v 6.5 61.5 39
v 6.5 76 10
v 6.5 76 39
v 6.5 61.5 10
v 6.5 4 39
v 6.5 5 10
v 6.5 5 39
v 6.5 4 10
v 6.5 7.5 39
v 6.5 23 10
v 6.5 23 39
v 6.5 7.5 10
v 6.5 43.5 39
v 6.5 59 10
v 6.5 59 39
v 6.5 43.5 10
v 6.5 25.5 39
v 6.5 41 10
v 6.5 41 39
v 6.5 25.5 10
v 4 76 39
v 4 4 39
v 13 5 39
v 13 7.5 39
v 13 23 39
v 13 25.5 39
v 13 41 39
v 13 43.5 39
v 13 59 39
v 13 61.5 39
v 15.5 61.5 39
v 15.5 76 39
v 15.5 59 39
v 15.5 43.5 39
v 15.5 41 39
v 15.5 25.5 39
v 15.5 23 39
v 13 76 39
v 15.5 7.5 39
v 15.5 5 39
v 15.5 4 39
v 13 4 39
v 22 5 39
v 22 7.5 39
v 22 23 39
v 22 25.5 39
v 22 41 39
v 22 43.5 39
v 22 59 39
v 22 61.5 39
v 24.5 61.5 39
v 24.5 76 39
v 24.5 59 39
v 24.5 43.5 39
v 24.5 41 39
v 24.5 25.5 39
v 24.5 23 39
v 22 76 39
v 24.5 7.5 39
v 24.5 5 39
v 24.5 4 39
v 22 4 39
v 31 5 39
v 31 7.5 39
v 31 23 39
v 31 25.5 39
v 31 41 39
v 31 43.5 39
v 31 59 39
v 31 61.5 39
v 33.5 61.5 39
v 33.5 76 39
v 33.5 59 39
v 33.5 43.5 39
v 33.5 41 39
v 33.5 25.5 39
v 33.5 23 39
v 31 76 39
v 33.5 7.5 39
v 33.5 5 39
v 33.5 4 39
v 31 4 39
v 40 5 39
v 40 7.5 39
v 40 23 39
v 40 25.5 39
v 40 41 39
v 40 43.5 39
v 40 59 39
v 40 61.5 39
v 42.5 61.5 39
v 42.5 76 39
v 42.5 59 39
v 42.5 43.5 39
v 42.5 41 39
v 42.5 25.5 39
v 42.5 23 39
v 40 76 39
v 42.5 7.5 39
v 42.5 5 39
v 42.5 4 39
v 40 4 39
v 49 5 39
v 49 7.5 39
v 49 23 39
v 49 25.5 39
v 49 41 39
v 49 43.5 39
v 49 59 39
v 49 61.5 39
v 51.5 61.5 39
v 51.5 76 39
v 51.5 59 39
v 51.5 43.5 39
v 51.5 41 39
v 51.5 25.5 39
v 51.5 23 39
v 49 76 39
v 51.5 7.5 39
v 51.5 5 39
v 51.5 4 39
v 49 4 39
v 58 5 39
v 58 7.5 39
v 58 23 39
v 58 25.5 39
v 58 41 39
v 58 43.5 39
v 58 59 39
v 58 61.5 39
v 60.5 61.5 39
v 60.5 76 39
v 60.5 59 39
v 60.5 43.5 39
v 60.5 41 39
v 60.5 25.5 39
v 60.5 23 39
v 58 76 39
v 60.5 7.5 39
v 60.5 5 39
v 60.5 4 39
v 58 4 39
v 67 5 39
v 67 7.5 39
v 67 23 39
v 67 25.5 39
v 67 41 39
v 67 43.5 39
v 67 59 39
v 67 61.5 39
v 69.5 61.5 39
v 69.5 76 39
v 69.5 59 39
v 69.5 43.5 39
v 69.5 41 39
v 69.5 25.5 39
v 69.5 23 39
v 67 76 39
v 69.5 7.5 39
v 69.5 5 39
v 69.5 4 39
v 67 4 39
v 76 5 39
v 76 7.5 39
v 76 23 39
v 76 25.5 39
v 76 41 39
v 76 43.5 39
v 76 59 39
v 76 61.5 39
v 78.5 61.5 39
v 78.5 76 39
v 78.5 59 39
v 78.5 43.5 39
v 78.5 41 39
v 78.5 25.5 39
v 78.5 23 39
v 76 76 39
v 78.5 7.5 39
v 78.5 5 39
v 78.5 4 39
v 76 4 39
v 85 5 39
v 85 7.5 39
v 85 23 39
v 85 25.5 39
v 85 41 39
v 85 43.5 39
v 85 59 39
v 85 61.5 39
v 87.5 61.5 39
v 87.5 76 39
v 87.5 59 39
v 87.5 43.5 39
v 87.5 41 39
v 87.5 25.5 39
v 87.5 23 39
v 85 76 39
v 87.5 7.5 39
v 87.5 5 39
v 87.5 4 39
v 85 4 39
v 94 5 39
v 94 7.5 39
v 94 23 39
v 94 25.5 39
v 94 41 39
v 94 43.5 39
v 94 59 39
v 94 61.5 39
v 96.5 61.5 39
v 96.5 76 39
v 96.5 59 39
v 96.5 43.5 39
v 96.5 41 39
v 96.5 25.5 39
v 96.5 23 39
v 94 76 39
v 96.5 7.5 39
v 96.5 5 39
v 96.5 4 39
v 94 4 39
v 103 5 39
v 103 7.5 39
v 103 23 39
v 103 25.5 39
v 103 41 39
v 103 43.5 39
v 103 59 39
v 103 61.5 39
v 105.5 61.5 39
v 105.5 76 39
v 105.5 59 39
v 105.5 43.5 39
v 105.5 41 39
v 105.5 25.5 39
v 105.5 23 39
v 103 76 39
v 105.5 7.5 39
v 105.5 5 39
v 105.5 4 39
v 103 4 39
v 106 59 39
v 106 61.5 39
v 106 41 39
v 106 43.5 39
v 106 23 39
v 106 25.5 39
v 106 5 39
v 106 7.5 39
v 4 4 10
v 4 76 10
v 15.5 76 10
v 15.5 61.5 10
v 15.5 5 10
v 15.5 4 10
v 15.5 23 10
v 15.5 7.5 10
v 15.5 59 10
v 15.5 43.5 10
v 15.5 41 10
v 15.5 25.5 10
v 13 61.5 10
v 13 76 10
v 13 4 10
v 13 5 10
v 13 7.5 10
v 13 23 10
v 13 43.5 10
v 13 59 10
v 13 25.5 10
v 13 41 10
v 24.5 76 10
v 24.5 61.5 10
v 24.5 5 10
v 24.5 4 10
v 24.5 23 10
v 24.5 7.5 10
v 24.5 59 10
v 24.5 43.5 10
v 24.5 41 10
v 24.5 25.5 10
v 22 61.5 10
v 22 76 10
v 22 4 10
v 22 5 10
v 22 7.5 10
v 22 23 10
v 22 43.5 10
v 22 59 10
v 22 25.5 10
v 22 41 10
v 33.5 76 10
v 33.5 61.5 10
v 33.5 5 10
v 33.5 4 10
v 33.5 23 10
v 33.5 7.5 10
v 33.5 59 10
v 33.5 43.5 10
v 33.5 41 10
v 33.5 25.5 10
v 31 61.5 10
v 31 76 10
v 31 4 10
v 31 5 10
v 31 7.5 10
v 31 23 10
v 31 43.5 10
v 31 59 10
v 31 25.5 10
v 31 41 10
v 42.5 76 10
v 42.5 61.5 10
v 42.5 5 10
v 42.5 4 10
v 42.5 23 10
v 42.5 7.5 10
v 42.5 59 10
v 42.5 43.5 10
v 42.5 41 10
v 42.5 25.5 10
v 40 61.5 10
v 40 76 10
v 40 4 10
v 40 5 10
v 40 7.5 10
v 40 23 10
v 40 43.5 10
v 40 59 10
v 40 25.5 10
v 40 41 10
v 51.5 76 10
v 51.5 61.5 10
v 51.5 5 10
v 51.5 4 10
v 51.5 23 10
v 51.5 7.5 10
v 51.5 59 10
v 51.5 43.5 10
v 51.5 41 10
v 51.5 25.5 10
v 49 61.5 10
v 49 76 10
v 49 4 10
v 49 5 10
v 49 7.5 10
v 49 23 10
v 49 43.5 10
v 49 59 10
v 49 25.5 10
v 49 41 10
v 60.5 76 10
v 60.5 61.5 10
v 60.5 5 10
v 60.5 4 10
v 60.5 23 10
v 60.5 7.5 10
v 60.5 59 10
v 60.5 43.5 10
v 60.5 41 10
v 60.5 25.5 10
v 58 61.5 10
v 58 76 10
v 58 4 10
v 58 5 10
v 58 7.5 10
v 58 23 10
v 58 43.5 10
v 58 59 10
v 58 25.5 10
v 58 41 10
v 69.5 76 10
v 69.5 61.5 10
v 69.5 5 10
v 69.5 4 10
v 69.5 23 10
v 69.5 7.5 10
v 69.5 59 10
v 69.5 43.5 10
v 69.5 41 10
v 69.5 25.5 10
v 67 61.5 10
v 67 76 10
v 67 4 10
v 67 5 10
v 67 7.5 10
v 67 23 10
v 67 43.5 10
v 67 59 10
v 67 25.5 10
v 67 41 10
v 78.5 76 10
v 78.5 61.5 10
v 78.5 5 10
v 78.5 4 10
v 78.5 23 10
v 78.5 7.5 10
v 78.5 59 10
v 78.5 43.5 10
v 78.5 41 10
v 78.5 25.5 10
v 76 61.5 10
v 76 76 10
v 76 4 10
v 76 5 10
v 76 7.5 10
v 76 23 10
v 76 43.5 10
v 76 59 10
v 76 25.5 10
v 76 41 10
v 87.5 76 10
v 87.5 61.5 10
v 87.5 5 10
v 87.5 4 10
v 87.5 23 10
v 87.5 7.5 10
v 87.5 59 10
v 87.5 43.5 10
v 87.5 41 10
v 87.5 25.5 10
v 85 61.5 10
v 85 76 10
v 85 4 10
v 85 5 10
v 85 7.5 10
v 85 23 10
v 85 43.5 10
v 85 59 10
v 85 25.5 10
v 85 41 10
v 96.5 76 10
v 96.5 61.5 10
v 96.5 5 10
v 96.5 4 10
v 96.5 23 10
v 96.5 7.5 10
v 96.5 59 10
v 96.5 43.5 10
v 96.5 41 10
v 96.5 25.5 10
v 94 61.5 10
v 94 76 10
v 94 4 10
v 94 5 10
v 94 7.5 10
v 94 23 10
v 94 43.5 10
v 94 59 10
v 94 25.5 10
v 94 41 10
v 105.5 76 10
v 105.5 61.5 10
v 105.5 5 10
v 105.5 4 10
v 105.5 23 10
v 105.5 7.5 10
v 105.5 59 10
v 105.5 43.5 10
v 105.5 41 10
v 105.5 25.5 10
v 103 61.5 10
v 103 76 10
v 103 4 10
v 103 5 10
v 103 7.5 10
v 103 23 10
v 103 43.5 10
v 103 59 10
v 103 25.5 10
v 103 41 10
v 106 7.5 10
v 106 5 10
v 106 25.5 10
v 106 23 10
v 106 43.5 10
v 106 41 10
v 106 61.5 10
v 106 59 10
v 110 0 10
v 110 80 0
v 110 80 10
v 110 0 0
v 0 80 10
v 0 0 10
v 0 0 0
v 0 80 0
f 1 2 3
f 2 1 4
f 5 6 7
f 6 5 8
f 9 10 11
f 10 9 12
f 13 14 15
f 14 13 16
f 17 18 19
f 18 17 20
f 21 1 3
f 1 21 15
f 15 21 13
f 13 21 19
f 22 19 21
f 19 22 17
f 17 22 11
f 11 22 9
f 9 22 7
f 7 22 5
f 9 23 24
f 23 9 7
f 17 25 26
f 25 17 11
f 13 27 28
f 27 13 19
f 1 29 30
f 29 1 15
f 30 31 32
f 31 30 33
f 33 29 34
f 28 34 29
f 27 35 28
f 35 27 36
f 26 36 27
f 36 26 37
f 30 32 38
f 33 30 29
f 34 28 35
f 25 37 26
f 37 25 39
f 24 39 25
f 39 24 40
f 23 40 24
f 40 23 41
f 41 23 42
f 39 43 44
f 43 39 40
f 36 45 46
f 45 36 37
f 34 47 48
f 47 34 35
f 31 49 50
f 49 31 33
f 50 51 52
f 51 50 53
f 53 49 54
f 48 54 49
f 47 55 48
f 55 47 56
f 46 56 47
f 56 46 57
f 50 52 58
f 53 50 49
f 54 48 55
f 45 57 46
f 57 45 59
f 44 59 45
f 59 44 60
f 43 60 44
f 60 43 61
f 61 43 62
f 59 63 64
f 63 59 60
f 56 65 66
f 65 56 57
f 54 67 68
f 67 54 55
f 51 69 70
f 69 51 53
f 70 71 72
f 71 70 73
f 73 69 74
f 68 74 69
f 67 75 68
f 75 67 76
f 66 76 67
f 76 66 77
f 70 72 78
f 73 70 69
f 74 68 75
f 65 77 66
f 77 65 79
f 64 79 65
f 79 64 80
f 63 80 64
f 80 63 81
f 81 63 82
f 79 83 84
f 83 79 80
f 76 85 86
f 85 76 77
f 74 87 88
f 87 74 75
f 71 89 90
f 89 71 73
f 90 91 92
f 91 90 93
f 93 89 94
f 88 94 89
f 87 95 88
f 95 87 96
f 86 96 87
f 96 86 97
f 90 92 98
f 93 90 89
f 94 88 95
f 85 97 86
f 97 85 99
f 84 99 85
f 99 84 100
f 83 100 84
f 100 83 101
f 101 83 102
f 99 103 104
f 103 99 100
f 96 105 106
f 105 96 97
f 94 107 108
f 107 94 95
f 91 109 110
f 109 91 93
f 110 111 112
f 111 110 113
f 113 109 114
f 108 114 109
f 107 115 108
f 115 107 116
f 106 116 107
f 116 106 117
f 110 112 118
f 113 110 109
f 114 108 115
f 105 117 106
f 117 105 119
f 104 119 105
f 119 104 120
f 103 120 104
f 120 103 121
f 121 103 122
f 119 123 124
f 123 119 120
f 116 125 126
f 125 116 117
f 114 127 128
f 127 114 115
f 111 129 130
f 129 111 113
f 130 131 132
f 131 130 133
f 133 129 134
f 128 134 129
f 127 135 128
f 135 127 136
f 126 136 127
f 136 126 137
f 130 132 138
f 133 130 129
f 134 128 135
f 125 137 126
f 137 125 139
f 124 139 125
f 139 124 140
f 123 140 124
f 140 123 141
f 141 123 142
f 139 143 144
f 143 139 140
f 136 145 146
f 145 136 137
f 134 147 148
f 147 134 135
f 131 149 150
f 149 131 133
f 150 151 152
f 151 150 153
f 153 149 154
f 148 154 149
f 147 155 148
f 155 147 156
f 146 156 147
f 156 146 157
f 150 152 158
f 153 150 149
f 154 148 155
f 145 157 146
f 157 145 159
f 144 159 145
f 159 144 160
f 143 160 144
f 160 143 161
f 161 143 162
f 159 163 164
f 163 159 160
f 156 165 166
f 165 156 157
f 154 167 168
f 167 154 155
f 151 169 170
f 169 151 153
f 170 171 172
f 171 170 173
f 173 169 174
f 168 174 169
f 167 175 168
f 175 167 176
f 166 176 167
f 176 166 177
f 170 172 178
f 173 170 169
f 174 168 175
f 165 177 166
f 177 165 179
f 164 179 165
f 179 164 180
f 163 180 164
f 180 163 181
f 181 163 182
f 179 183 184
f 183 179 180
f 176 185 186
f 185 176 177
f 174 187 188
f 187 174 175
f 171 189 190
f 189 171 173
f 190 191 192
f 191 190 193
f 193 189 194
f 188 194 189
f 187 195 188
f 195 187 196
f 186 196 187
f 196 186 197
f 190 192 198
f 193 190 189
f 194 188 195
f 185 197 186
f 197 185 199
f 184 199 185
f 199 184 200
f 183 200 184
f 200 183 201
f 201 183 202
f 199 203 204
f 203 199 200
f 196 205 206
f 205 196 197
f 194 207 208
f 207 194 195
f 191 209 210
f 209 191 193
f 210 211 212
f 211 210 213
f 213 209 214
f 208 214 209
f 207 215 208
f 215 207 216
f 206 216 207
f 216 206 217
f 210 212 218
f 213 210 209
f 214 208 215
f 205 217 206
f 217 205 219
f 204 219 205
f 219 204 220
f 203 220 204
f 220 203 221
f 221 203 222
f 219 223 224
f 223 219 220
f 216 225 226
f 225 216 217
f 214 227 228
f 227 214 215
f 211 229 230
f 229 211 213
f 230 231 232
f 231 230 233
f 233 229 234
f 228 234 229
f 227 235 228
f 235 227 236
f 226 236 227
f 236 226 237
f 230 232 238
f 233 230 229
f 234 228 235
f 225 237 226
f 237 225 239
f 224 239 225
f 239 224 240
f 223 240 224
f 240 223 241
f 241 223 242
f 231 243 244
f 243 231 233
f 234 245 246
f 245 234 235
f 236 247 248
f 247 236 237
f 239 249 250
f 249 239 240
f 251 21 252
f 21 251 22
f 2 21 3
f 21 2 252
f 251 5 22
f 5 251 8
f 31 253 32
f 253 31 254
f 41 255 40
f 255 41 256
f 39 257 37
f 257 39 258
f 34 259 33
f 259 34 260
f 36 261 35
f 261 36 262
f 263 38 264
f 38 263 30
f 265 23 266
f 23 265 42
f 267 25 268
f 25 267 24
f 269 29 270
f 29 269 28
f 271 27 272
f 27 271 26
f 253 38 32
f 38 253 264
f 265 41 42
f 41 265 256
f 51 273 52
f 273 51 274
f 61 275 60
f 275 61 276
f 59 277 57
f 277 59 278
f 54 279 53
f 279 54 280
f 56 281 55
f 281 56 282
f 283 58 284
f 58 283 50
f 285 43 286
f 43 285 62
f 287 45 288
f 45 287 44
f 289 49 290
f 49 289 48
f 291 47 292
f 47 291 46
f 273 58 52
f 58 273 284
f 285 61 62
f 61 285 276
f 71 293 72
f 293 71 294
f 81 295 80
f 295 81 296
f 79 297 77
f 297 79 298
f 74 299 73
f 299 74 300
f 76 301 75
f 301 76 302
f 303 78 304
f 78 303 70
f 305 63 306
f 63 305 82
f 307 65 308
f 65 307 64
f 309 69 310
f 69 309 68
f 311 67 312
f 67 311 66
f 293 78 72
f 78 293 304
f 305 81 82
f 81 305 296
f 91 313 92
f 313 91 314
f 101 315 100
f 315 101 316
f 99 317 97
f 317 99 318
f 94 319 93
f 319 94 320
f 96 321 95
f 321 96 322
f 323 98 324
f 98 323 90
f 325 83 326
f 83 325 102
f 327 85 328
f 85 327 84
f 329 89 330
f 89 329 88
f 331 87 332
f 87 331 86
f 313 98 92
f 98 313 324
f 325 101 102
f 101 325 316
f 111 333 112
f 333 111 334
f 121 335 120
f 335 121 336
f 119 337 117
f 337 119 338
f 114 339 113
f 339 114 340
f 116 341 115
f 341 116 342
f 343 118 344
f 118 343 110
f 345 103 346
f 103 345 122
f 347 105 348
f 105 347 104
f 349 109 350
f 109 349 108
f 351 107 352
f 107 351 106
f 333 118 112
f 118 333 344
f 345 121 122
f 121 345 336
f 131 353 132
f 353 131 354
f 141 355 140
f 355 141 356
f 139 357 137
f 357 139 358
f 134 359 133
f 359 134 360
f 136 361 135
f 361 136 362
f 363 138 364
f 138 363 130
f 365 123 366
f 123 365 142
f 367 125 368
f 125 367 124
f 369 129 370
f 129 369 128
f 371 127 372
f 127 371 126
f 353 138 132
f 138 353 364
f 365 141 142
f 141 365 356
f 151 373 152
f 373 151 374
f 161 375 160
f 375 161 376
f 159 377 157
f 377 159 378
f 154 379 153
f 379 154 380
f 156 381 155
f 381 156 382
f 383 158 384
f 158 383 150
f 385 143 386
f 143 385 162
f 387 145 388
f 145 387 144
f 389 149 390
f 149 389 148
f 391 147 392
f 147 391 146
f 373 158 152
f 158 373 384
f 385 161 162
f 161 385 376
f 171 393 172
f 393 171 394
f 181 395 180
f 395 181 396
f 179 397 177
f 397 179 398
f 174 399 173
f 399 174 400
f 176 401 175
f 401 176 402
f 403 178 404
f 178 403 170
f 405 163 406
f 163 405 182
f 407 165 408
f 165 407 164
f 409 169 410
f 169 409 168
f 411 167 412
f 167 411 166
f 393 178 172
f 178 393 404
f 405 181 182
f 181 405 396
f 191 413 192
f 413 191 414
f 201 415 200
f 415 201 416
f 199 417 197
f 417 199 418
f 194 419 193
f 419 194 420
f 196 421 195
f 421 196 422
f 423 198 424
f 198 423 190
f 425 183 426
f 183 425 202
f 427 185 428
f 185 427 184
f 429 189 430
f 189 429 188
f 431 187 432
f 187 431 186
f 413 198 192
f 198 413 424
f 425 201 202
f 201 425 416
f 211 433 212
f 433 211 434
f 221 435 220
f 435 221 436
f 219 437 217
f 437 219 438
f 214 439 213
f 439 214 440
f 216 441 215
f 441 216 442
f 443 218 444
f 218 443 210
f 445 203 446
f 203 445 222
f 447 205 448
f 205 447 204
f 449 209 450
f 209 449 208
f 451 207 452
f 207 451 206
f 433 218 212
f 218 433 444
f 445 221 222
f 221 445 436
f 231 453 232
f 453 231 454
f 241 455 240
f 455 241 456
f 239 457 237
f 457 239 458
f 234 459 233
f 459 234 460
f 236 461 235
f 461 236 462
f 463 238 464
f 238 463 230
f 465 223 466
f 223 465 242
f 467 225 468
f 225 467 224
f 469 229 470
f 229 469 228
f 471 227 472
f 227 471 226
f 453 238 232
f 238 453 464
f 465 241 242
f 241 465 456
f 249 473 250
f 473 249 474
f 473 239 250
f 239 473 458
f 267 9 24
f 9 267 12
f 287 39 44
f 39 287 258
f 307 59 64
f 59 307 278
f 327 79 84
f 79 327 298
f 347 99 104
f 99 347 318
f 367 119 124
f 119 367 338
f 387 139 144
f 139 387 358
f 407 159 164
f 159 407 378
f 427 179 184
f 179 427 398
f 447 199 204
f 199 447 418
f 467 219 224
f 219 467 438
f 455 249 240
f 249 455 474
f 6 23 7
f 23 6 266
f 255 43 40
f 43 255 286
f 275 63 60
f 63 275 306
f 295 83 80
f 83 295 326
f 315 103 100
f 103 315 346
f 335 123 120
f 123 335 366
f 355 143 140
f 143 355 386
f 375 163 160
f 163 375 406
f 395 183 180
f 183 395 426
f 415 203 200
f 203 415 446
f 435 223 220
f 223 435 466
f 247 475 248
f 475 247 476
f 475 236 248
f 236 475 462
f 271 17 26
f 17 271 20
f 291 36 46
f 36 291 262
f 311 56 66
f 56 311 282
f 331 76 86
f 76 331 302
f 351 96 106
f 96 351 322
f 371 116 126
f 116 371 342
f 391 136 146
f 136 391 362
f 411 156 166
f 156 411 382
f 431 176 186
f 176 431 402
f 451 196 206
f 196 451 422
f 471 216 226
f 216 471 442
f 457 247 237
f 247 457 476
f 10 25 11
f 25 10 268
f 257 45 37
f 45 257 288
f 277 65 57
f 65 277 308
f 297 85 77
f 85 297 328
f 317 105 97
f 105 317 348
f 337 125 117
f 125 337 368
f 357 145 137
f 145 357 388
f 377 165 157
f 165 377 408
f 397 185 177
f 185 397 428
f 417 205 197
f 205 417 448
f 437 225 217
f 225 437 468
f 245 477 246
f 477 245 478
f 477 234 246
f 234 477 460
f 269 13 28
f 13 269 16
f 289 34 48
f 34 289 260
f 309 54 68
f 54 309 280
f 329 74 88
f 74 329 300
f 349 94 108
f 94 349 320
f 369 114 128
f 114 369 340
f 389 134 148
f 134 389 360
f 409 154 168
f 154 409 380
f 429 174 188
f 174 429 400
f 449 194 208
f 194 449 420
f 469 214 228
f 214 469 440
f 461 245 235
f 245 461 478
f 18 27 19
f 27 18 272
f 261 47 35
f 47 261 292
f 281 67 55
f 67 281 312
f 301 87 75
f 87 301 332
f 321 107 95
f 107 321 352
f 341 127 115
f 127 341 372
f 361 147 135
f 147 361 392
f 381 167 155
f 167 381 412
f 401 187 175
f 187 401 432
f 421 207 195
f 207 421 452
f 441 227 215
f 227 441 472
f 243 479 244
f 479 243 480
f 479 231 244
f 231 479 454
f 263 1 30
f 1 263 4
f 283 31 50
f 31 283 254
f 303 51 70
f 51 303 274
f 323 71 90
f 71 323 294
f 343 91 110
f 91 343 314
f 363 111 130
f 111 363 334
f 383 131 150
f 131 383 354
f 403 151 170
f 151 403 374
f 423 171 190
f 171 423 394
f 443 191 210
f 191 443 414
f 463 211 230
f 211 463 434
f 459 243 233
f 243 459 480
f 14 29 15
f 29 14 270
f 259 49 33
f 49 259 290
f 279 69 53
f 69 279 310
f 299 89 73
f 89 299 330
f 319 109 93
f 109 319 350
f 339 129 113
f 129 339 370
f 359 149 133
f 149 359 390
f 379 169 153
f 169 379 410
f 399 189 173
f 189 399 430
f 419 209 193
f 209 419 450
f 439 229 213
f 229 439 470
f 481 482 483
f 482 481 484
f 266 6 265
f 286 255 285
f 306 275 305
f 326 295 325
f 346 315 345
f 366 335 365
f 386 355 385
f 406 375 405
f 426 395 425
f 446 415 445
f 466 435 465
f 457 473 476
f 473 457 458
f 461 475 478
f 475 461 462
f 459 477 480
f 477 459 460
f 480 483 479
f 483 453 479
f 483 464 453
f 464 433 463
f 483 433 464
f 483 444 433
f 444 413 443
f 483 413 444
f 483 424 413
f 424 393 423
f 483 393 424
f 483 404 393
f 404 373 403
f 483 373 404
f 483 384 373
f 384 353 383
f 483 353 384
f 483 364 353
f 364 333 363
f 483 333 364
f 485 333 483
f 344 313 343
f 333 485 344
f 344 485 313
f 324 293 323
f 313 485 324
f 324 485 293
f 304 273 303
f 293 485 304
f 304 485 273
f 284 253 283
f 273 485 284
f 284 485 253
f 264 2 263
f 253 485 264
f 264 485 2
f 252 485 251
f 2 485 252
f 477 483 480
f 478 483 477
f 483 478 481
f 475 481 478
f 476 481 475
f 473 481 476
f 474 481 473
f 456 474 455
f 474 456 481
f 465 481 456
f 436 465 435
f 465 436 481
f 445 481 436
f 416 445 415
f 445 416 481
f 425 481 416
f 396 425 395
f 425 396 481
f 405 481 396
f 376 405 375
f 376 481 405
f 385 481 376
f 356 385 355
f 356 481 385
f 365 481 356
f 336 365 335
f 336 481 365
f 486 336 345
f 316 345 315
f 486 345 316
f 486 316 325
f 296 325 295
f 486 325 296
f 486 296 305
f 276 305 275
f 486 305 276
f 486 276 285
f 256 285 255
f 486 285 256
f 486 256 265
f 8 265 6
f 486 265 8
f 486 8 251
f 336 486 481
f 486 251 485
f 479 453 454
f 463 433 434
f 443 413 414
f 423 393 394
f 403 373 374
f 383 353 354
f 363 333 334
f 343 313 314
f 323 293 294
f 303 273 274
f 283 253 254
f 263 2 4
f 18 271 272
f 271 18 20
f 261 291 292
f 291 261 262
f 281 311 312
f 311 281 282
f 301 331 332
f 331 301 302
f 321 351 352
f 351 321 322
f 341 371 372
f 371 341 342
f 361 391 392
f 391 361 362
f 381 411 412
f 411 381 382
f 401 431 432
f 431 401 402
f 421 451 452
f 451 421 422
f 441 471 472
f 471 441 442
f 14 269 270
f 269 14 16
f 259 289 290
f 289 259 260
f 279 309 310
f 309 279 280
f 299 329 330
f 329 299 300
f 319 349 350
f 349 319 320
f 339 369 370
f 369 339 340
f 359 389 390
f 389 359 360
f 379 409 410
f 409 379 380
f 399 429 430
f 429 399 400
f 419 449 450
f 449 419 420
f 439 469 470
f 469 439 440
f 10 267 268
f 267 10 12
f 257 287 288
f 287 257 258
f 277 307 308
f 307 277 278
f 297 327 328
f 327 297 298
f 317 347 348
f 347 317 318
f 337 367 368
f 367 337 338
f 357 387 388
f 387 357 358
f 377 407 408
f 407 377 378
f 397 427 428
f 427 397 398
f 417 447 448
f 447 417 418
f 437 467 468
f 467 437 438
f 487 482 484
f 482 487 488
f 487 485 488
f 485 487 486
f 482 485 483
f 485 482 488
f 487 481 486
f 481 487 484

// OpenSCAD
$fn = 32;

// ----------------------------------------------------------------------
// Heatsink: cross fin block
// ----------------------------------------------------------------------

// --- parameters (mm) ---
base_l = 110;             // base length, X
base_w = 80;              // base width, Y
base_t = 10;              // base plate thickness
fin_h = 30;               // fin height above the base
fin_t = 2.5;              // fin thickness
edge = 4;                 // margin from the base ends
pitch = 9;                // fin pitch
rib_pitch = 18;           // cross rib pitch

n_fins = floor((base_l - 2 * edge - fin_t) / pitch) + 1;  // fin count
total_h = base_t + fin_h - 1;  // overall height
n_ribs = floor((base_w - 2 * edge) / rib_pitch);  // rib count

union() {
  cube([base_l, base_w, base_t]);
  for (i = [0 : n_fins - 1])
    translate([edge + i * pitch, edge, base_t - 1])
      cube([fin_t, base_w - 2 * edge, fin_h]);
  for (i = [0 : n_ribs - 1])
    translate([edge, edge + 1 + i * rib_pitch, base_t - 1])
      cube([base_l - 2 * edge, fin_t, fin_h]);
}
